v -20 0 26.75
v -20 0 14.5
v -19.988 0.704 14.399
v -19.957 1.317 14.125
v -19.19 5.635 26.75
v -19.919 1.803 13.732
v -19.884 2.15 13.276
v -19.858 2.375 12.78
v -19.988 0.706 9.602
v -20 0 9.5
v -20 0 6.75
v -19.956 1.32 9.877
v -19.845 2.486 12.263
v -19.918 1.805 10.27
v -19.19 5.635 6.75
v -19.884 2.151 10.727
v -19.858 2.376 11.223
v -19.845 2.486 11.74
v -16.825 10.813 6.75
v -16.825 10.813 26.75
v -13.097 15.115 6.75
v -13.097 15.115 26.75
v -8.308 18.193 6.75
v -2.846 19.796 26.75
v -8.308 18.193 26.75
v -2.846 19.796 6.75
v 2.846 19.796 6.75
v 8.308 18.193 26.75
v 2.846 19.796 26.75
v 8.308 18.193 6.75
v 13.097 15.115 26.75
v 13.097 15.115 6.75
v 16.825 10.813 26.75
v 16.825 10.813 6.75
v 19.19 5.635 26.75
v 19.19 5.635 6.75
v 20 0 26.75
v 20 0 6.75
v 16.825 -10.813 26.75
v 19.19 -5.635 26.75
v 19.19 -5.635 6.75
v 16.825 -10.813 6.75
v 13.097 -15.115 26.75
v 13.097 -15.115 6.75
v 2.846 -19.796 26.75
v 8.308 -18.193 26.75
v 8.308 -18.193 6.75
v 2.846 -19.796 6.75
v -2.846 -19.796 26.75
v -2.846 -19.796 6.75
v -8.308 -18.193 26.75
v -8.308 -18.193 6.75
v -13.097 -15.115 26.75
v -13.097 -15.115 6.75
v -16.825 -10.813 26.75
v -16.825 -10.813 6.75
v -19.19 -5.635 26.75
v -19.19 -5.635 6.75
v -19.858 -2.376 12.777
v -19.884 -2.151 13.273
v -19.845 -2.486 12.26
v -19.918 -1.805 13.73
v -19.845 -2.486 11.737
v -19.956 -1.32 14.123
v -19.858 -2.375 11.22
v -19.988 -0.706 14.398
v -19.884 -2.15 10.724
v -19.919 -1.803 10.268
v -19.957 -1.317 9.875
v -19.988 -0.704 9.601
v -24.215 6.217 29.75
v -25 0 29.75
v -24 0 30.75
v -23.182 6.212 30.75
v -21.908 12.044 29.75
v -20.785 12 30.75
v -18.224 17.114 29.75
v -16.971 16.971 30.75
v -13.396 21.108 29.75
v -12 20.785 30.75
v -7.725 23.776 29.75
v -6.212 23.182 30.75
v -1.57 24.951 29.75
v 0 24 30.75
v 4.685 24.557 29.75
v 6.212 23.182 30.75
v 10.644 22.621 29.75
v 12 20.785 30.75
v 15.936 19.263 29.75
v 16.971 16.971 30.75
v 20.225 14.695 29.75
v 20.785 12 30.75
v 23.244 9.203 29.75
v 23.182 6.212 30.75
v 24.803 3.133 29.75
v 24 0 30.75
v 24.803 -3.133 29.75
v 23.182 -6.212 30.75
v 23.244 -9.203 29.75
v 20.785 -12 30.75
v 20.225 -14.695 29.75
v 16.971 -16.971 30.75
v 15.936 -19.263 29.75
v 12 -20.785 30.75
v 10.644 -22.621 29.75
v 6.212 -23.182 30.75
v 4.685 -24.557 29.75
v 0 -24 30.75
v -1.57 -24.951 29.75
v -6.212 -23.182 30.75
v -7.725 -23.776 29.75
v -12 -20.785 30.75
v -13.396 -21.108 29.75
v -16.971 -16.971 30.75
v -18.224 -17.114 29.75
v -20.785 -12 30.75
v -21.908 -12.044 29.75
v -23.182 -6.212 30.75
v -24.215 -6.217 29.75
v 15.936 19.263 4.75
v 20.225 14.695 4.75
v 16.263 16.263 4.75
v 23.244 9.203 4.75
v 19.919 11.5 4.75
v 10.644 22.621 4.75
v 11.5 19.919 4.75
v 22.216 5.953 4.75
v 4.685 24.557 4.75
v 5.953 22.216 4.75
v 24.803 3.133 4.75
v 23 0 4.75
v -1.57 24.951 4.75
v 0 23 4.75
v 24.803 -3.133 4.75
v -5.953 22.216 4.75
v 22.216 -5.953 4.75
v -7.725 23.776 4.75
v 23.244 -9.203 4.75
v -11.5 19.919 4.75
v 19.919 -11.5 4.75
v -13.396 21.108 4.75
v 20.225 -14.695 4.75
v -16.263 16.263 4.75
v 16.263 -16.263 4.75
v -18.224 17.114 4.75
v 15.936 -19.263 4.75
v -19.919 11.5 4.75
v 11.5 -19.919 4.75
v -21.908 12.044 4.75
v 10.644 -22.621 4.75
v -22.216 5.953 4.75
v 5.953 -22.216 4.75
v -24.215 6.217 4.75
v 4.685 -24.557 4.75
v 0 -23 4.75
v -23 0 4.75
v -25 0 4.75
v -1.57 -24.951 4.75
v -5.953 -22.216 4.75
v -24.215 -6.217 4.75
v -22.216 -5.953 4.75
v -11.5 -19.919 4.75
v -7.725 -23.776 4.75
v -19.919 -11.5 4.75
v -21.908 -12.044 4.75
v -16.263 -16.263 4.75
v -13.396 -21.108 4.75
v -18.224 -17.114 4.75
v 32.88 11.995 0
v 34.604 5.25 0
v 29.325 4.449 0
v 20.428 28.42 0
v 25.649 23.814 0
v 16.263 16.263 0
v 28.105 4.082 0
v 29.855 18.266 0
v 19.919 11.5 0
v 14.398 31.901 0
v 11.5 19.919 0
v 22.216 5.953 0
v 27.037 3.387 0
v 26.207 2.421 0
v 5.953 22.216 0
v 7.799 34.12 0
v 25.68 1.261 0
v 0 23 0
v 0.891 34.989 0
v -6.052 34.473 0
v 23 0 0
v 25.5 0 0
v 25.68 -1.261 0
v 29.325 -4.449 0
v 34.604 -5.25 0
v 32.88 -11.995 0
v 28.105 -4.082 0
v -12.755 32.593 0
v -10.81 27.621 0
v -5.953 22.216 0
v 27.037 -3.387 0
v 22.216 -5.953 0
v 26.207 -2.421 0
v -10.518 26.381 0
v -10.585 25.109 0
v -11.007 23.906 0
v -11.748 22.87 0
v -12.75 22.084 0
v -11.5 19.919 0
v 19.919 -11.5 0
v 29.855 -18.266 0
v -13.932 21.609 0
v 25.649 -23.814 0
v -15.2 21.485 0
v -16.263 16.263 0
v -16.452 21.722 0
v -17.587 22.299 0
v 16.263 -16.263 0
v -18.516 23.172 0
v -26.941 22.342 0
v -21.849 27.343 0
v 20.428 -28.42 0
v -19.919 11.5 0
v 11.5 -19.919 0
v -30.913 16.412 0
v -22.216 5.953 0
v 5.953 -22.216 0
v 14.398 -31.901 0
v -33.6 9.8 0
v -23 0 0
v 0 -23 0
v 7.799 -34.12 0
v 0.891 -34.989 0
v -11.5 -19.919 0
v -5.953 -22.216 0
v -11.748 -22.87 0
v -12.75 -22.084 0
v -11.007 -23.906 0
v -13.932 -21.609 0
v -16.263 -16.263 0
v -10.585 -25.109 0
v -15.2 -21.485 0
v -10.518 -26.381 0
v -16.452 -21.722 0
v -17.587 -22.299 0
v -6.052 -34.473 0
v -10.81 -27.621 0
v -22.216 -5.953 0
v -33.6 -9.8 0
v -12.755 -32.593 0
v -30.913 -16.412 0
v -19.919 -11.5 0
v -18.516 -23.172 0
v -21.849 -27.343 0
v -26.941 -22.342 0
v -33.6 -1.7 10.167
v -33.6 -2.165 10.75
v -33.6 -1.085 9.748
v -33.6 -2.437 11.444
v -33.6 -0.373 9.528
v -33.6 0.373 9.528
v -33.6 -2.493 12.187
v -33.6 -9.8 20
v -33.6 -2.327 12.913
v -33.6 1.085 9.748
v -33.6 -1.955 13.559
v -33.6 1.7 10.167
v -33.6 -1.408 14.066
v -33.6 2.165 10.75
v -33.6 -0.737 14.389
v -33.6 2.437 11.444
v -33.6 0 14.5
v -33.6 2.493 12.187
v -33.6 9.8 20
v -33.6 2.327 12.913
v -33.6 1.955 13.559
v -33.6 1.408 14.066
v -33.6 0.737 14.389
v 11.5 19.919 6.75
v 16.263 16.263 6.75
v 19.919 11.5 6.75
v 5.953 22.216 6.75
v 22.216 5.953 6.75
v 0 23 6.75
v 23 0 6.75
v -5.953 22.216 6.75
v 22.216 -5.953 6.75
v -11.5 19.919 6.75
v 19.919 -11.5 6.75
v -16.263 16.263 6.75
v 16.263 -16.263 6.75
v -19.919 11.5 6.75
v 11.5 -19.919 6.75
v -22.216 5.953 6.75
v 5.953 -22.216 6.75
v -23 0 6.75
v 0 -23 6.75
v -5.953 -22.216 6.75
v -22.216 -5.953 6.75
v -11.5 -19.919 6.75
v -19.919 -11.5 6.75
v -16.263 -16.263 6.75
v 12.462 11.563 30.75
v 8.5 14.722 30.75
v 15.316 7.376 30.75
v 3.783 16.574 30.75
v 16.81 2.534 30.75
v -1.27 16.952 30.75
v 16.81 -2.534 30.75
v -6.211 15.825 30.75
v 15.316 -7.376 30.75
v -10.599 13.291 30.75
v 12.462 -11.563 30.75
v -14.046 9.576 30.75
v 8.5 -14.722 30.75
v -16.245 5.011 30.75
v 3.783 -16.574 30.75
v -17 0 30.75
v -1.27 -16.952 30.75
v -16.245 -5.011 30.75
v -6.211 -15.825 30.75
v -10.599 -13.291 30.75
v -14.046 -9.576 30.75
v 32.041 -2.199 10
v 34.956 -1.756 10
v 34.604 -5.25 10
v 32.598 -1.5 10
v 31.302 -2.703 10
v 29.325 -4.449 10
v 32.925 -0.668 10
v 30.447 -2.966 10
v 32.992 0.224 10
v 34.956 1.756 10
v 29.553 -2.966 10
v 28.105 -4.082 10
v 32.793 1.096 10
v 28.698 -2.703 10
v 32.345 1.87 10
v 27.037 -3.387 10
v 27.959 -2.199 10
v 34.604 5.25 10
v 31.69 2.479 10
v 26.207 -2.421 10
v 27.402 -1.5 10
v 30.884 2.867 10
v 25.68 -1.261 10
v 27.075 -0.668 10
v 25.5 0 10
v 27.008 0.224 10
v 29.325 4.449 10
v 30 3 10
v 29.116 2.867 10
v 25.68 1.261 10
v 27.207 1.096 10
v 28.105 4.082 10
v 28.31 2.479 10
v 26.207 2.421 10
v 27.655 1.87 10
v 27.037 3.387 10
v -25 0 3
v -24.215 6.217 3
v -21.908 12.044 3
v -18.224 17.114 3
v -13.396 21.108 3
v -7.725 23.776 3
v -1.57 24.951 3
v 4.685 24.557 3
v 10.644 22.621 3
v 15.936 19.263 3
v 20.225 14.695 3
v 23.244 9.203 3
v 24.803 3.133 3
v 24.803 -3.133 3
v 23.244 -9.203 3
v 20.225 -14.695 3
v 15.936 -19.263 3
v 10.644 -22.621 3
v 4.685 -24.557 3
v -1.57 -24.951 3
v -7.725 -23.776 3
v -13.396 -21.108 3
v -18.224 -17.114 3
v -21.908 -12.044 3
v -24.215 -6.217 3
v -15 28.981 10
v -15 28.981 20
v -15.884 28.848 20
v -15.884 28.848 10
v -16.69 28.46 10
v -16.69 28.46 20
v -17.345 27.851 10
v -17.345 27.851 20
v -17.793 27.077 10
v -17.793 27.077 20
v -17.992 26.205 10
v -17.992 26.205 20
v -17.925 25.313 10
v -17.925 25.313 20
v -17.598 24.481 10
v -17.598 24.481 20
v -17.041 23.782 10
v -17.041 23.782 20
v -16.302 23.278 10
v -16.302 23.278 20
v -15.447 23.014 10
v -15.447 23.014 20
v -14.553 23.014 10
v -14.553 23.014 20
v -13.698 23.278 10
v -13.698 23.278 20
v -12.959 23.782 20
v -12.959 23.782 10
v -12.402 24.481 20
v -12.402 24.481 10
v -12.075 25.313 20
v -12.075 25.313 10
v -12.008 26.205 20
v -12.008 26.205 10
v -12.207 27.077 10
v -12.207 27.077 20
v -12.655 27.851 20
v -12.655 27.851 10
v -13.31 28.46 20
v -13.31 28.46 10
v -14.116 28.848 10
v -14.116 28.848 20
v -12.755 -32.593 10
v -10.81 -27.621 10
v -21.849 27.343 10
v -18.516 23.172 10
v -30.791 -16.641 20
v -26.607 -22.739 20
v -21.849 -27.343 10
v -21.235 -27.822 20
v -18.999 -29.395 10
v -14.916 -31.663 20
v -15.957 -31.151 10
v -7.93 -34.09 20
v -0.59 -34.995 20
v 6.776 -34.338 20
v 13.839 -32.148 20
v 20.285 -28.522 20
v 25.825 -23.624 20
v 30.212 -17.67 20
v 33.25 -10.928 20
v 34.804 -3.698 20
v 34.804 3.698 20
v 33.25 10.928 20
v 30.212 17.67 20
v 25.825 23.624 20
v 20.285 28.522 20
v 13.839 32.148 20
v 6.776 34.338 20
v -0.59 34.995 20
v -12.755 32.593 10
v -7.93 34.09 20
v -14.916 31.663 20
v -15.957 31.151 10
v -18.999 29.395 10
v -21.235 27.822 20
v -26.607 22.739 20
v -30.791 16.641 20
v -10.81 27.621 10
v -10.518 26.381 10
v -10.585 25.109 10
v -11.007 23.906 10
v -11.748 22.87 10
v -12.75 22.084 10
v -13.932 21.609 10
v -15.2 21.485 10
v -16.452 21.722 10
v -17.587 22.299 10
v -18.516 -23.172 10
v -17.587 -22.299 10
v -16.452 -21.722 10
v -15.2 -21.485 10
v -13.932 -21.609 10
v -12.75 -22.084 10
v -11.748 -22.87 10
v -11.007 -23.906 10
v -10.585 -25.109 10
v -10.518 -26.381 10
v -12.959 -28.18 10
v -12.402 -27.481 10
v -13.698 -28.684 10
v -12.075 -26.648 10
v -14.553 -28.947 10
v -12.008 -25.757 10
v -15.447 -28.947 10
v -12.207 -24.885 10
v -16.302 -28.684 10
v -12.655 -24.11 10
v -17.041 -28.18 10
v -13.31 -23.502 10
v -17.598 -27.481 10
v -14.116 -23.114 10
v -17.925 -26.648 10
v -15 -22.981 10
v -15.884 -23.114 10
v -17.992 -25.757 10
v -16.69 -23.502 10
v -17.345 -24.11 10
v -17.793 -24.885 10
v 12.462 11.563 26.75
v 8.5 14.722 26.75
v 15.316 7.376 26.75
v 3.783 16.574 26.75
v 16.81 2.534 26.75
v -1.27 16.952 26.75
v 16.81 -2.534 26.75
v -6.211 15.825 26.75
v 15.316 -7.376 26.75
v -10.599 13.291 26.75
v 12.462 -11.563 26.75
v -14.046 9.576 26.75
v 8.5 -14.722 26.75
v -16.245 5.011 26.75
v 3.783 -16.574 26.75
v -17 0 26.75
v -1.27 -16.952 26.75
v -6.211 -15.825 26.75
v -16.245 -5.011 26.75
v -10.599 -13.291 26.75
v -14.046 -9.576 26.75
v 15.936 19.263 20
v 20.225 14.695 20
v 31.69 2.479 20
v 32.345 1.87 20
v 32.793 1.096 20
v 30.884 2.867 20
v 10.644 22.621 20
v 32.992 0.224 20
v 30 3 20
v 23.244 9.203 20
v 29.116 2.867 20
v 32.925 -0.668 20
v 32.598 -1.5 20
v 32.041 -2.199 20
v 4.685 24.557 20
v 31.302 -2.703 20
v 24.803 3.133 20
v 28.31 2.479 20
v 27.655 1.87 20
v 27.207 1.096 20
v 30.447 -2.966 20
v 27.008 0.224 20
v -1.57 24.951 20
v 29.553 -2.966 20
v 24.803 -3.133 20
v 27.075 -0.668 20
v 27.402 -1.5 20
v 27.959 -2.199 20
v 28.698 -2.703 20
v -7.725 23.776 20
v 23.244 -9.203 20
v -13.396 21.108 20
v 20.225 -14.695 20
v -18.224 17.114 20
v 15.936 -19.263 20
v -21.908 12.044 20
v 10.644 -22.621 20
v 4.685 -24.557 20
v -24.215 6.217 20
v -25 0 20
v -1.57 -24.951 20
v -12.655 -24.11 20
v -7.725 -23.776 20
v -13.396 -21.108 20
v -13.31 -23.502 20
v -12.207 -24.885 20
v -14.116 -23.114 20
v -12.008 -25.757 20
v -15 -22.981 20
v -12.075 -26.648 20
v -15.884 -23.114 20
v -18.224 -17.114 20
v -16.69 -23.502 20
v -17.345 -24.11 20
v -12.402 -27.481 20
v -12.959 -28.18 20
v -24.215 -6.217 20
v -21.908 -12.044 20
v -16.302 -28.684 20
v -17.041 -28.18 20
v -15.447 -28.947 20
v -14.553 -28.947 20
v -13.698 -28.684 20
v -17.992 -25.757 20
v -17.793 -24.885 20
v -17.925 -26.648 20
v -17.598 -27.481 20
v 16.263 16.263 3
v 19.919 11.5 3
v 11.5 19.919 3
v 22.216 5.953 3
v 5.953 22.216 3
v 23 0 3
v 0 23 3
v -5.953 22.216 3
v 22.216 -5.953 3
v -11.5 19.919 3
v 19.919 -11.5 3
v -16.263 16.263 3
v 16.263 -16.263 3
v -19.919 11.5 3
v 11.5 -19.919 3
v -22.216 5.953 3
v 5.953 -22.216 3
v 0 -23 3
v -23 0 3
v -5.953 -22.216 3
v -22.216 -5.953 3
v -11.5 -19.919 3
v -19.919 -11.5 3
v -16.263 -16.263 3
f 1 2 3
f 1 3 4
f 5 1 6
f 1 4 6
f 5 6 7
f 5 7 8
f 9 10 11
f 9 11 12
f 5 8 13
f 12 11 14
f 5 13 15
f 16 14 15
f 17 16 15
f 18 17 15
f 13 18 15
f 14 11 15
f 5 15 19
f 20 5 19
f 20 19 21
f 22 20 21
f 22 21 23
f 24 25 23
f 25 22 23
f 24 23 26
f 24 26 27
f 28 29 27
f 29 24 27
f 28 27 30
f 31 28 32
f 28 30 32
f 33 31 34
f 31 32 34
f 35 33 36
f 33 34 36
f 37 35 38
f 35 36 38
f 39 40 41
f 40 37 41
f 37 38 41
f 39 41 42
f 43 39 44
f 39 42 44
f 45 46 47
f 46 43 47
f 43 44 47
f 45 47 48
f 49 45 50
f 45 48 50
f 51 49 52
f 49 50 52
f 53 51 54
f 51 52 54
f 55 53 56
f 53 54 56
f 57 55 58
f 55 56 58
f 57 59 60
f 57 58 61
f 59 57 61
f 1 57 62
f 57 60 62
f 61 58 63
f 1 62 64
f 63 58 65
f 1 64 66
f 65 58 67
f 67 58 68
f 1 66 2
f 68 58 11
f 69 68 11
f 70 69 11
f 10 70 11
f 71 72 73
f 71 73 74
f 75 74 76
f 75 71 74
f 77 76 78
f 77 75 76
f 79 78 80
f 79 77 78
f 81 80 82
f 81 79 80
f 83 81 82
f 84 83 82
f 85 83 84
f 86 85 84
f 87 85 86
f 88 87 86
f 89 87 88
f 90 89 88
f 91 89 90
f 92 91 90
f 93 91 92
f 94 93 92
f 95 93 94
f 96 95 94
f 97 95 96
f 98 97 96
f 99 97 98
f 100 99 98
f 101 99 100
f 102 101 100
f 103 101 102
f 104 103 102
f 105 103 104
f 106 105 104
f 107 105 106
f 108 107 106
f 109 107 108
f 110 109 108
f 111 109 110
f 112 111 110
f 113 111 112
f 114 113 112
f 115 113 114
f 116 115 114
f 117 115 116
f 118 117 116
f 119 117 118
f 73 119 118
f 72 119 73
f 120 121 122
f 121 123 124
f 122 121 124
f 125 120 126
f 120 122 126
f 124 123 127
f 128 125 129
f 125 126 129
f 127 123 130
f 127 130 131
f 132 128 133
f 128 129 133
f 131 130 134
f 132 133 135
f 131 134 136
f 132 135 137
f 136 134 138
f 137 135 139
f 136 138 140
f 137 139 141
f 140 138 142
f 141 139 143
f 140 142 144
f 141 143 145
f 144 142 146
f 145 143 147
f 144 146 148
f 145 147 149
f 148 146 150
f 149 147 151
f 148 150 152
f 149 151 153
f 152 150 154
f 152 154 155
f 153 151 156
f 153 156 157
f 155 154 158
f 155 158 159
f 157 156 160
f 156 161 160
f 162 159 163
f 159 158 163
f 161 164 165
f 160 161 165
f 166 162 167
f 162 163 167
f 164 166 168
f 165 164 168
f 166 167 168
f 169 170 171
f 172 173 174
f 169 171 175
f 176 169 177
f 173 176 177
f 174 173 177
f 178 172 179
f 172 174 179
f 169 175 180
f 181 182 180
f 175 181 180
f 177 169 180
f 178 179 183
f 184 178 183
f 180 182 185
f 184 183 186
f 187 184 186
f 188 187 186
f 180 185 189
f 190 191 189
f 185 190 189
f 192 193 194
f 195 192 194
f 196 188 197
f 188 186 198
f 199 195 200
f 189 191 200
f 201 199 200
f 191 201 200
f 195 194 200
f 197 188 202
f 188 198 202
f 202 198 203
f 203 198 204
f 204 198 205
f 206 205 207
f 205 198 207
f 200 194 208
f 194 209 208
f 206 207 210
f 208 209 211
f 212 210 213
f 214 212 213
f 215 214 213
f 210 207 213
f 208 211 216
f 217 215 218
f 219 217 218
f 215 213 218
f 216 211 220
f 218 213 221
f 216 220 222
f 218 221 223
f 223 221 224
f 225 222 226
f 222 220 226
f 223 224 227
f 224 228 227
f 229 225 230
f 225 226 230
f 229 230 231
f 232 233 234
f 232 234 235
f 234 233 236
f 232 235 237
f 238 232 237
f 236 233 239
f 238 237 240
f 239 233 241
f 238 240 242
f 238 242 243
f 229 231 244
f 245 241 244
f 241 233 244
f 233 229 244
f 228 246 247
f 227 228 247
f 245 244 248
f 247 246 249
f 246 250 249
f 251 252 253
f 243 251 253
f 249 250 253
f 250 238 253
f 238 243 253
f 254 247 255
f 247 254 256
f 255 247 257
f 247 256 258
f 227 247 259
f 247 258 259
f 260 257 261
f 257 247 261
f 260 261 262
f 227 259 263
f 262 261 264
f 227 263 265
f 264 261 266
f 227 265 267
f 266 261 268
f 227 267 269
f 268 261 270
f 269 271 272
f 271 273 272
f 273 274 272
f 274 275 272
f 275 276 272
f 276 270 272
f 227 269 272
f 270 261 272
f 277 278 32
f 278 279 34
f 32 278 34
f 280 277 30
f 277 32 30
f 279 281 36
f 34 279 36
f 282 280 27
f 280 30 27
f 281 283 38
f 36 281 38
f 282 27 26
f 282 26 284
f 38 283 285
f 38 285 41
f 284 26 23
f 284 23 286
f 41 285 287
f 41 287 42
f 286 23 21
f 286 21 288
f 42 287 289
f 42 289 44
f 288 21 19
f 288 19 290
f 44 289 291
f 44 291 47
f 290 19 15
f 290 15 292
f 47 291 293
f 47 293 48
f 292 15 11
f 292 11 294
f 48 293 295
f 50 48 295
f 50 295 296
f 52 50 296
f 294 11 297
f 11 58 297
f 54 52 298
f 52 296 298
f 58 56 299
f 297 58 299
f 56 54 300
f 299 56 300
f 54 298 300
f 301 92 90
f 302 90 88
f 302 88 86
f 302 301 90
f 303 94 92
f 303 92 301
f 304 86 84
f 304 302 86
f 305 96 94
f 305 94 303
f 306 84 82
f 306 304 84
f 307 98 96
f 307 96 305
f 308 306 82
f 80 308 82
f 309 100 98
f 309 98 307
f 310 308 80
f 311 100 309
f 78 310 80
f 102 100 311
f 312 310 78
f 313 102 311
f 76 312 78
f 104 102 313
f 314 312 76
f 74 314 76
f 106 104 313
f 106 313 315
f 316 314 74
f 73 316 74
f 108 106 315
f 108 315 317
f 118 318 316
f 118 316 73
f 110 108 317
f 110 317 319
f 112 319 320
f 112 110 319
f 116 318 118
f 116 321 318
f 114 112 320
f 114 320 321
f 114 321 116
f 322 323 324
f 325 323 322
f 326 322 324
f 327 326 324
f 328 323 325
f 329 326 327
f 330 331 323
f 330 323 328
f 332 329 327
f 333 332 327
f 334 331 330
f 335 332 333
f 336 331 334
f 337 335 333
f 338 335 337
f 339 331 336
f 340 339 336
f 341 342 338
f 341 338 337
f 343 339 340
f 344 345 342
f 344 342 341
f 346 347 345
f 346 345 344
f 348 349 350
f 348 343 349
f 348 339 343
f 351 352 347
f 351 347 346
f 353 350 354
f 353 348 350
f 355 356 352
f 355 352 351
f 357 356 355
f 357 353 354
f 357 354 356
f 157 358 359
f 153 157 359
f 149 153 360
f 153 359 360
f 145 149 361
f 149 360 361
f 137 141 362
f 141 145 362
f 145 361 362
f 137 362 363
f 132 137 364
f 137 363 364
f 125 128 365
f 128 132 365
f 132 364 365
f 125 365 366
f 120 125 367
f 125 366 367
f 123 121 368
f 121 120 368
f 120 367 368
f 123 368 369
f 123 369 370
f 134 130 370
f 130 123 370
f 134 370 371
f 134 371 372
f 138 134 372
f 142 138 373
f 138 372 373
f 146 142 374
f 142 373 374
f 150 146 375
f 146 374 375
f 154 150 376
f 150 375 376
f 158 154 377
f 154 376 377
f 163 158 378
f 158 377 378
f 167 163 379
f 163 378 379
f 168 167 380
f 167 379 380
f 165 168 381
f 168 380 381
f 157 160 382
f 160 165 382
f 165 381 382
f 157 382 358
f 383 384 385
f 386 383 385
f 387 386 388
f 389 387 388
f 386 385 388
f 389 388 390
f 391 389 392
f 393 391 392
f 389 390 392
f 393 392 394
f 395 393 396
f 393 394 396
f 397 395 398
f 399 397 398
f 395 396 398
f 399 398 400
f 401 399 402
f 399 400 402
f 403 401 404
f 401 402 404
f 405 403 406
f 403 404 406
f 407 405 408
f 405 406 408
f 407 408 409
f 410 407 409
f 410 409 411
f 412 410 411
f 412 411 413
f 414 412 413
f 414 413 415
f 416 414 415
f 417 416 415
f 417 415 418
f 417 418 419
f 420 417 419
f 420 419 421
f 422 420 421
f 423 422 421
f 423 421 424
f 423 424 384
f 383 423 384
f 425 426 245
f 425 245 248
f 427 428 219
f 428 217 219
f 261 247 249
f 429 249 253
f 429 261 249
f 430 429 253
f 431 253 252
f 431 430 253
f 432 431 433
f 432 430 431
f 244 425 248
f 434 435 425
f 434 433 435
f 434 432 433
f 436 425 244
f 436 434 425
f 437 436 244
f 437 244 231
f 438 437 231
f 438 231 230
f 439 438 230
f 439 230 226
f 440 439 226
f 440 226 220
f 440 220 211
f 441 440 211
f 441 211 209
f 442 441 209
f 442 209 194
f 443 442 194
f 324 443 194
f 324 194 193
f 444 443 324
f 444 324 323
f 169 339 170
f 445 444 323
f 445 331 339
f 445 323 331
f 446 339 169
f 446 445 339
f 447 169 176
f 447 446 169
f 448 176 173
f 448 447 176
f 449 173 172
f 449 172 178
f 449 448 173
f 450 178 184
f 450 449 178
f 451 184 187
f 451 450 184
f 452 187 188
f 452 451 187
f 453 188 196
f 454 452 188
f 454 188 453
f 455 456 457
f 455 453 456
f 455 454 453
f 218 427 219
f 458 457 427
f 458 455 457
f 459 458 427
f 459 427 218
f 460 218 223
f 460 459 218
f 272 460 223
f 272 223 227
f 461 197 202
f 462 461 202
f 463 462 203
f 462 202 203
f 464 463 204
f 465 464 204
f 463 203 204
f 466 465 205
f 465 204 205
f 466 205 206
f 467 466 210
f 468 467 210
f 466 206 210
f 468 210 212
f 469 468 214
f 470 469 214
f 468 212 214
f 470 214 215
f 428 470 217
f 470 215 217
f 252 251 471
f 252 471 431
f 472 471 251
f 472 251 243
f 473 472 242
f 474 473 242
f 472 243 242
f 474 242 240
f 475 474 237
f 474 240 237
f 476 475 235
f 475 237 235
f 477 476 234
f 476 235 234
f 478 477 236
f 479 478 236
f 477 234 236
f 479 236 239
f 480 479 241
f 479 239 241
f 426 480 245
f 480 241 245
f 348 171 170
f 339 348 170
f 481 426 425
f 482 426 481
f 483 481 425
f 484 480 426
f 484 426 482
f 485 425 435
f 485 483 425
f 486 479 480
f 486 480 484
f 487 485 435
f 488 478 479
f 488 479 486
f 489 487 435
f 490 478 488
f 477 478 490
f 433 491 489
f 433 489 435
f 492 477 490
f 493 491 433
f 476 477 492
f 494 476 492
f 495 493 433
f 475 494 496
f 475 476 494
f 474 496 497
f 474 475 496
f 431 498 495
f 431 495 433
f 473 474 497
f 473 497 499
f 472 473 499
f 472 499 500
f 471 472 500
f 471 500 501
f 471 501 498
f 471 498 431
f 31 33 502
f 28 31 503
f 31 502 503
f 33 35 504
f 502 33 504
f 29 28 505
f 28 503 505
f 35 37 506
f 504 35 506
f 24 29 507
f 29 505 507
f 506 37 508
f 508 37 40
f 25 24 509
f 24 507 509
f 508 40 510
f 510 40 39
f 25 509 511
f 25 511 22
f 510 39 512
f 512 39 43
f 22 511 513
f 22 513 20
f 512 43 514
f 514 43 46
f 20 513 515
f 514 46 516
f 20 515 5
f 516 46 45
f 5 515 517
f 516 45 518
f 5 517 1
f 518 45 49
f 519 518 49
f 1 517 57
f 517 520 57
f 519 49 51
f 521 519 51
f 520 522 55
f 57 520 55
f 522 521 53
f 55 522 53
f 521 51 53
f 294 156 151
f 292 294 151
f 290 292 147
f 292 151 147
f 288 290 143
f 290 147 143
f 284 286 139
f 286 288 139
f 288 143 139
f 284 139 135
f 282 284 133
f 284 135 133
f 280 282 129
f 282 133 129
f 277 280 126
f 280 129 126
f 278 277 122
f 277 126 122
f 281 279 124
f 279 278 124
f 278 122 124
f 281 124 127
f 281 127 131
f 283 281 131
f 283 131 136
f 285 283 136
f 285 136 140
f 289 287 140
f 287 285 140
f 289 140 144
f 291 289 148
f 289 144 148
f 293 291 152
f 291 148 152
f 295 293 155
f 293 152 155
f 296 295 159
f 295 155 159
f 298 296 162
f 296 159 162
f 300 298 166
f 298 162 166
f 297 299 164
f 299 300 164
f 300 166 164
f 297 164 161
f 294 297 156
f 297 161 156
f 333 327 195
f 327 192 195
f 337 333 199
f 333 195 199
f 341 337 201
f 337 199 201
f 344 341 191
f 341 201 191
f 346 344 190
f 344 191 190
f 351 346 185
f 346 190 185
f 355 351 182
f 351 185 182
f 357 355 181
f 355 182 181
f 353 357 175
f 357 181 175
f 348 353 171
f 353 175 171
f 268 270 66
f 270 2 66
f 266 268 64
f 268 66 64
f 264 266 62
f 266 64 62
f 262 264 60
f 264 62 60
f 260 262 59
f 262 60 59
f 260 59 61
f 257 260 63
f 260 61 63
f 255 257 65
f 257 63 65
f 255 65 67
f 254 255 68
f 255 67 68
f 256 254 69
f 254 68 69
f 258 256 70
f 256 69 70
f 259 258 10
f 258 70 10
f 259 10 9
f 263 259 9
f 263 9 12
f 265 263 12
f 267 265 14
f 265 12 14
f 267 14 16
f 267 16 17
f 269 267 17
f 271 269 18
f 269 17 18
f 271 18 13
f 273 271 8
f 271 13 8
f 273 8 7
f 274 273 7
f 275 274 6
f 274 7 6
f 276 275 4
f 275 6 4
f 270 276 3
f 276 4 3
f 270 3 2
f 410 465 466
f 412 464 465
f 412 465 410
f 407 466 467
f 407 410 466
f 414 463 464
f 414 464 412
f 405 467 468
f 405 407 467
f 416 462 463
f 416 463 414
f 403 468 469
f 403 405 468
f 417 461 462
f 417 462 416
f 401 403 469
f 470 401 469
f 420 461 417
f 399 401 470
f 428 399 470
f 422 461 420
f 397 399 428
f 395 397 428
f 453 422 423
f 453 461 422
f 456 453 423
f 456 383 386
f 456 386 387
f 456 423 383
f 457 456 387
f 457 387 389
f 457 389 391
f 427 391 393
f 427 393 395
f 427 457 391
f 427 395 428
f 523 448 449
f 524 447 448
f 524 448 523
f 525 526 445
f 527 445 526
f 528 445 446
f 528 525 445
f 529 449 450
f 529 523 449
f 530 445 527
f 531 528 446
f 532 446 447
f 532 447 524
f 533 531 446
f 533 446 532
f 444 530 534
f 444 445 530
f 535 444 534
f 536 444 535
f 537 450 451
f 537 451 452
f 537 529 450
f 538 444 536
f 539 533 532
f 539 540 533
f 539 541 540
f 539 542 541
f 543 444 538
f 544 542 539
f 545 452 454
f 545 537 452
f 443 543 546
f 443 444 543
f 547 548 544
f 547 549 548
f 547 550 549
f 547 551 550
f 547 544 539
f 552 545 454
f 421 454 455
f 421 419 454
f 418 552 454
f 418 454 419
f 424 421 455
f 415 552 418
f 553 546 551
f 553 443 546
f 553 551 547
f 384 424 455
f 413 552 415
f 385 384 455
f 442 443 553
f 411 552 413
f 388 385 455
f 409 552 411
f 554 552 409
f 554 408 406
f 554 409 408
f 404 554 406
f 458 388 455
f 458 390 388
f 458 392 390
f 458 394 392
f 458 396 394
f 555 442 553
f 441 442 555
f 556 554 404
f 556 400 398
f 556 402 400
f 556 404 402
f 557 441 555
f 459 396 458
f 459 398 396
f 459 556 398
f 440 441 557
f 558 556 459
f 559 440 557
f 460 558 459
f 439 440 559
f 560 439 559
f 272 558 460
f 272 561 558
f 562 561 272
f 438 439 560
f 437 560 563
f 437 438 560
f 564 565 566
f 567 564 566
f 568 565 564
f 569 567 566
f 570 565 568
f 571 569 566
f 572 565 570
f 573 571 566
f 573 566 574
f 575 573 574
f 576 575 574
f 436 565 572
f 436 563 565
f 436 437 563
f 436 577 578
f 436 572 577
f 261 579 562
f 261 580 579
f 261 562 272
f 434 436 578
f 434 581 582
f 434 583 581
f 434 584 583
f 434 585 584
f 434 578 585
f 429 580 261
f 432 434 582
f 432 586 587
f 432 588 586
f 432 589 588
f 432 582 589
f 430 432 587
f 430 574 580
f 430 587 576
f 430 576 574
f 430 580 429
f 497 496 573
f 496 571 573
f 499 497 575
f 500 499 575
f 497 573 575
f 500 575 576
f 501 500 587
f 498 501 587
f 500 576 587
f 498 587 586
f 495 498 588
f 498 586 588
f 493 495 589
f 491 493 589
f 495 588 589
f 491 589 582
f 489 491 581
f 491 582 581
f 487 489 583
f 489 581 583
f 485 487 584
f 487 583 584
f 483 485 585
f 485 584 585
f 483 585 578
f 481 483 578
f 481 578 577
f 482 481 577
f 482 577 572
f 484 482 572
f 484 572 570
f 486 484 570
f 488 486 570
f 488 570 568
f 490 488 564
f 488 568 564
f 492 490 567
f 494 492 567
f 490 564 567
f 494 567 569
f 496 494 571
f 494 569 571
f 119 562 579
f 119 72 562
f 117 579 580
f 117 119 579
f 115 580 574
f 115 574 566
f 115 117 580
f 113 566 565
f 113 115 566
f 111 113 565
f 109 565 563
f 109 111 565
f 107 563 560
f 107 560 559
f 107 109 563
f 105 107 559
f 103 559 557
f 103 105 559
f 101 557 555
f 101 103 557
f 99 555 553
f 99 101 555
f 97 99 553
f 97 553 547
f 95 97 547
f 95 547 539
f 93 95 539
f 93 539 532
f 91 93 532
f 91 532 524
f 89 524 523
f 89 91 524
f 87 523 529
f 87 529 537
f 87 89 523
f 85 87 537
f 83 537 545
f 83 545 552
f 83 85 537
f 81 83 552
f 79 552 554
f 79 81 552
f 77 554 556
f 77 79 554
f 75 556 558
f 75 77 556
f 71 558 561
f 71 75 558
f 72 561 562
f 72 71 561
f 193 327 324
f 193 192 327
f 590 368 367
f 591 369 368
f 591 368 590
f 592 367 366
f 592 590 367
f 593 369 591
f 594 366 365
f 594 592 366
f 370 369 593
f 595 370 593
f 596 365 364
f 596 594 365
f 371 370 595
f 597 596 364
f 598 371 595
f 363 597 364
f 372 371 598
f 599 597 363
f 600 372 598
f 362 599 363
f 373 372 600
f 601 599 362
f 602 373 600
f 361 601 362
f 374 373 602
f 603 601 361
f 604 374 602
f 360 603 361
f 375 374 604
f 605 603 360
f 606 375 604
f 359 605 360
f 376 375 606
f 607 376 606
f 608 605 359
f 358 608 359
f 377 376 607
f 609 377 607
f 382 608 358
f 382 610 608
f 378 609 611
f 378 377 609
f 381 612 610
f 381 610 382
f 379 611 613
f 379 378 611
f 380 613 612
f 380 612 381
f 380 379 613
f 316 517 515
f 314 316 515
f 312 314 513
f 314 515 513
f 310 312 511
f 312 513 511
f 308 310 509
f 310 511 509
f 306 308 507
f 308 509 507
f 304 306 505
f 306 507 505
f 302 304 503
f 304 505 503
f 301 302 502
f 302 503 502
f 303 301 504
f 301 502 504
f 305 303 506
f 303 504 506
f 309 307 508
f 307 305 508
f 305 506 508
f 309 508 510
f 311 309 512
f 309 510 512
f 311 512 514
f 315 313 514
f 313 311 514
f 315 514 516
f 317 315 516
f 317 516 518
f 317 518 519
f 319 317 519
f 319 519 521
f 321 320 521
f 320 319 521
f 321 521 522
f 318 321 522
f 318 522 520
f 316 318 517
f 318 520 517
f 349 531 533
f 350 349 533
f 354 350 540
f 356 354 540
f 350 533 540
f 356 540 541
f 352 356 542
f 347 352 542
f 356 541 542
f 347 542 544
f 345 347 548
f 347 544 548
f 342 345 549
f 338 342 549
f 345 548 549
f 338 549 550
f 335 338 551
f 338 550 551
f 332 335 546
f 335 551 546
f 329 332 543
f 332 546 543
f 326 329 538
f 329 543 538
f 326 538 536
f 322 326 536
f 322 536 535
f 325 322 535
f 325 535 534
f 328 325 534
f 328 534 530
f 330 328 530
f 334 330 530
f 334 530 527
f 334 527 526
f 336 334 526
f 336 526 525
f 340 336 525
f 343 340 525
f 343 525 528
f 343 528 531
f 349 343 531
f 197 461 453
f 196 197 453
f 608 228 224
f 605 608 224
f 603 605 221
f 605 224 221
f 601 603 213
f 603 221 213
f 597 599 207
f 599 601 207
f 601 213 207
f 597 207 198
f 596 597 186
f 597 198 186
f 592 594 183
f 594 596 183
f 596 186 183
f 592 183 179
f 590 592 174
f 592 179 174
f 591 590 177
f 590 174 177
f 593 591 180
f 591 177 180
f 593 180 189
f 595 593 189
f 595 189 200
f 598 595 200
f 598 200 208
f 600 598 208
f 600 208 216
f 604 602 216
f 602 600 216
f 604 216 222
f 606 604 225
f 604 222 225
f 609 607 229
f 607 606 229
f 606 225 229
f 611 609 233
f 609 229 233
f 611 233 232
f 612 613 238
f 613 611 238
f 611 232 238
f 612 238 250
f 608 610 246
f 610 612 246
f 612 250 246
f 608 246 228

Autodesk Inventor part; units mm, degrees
ref_plane "XZ Plane" through (0, 0, 0) normal (0, 1, 0) x (-1, 0, 0)
ref_plane "XY Plane" through (0, 0, 0) normal (0, 0, 1) x (1, 0, 0)
sketch "Skizze1" plane through (0, 0, 0) normal (0, 1, 0) x (-1, 0, 0)
  line L0 (17, 30.75) -> (17, 26.75)
  line L1 (17, 26.75) -> (20, 26.75)
  line L2 (20, 26.75) -> (20, 6.75)
  line L3 (23, 0) -> (35, 0)
  line L4 (35, 0) -> (35, 20)
  line L5 (35, 20) -> (25, 20)
  line L6 (25, 20) -> (25, 30.75)
  line L7 (17, 30.75) -> (25, 30.75)
  line L8 (0, 0) -> (0, 48.4152)
  line L9 (20, 6.75) -> (23, 6.75)
  line L10 (23, 6.75) -> (23, 4.75)
  line L11 (23, 4.75) -> (25, 4.75)
  line L12 (25, 4.75) -> (25, 3)
  line L13 (25, 3) -> (23, 3)
  line L14 (23, 3) -> (23, 0)
  point P0 (17, 4)
  dimension "d1" = 40
  dimension "d3" = 20
  dimension "d4" = 70
  dimension "d5" = 50
  dimension "d7" = 4
  dimension "d10" = 2
  dimension "d11" = 1.75
  dimension "d12" = 3
  dimension "d13" = 3
  dimension "d14" = 2
  dimension "d15" = 34
  dimension "d16" = 20
revolve "Umdrehung1" add sketch "Skizze1" angle 360 about axis through (0, 0, 0) along (0, 0, 1)
sketch "Skizze2" plane through (0, 0, 0) normal (0, 0, -1) x (-1, 0, 0)
  circle A0 centre (0, 0) radius 23 projected
  circle A1 centre (0, 0) radius 35 projected
  arc A2 (-29.325, -4.4491) -> (-29.325, 4.4491) centre (-30, 0) ccw
  line L0 (-29.325, 4.4491) -> (-34.604, 5.25)
  line L1 (-29.325, -4.4491) -> (-34.604, -5.25)
  line L2 (49, 0) -> (-49, 0) projected
  line L3 (10.8095, -27.6207) -> (12.7554, -32.593)
  arc A3 (18.5155, -23.1717) -> (10.8095, -27.6207) centre (15, -25.9808) ccw
  line L4 (18.5155, -23.1717) -> (21.8486, -27.343)
  line L5 (18.5155, 23.1717) -> (21.8486, 27.343)
  arc A4 (10.8095, 27.6207) -> (18.5155, 23.1717) centre (15, 25.9808) ccw
  line L6 (10.8095, 27.6207) -> (12.7554, 32.593)
  arc A5 (21.8486, 27.343) -> (12.7554, 32.593) centre (0, 0) ccw
  arc A6 (12.7554, -32.593) -> (21.8486, -27.343) centre (0, 0) ccw
  arc A7 (-34.604, 5.25) -> (-34.604, -5.25) centre (0, 0) ccw
  dimension "d17" = 30
  dimension "d18" = 4.5
  dimension "d21" = 360
extrude "Extrusion1" cut sketch "Skizze2" against normal blind 10 contours L2 A1 L0 A2 | A2 L1 A1 L2 | L5 A4 L6 A1 | A1 L3 A3 L4
sketch "Skizze3" plane through (0, 0, 0) normal (0, 0, -1) x (-1, 0, 0)
  arc A0 (10.8095, 27.6207) -> (18.5155, 23.1717) centre (15, 25.9808) ccw projected
  arc A1 (-29.325, -4.4491) -> (-29.325, 4.4491) centre (-30, 0) ccw projected
  arc A2 (18.5155, -23.1717) -> (10.8095, -27.6207) centre (15, -25.9808) ccw projected
  point P0 (-30, 0)
  point P1 (15, 25.9808)
  point P2 (15, -25.9808)
hole "Bohrung1" at (30, 0, 0) at (-15, 25.9808, 0) at (-15, -25.9808, 0) direction (0, 0, 1) diameter 6 end through all
ref_plane "Arbeitsebene1" through (-40, 0, 0) normal (1, 0, 0) x (0, 1, 0)
sketch "Skizze4" plane through (-40, 0, 0) normal (1, 0, 0) x (0, 1, 0)
  line L0 (-25, 20) -> (25, 20) projected
  line L1 (10, 20) -> (-10, 20)
  line L2 (-10, 20) -> (-10, 0)
  line L3 (-10, 0) -> (10, 0)
  line L4 (10, 0) -> (10, 20)
  line L5 (-27.343, 0) -> (27.343, 0) projected
  line L6 (0, -4) -> (0, 24) projected
  point P0 (0, 0)
extrude "Extrusion2" cut sketch "Skizze4" along normal blind 6.4
sketch "Skizze5" plane through (-33.6, 0, 0) normal (-1, 0, 0) x (0, 0, 1)
  line L0 (-6.15, 0) -> (36.9, 0) projected
  line L1 (0, -9.8) -> (0, 9.8) projected
  point P0 (0, 0)
  point P1 (12, 0)
  dimension "d47" = 12
hole "Bohrung2" at (-33.6, 0, 12) direction (1, 0, 0) diameter 5 depth 20 tip angle 118
thread "Gewinde1" size "M6x1" class "6H" standard "ISO Metric profile" full length
chamfer "Fase1" distance 1 angle 45 1 edges at (25, 0, 30.75)
properties part number "KON_Nietmaschine_Deckel" material "Stahl"
